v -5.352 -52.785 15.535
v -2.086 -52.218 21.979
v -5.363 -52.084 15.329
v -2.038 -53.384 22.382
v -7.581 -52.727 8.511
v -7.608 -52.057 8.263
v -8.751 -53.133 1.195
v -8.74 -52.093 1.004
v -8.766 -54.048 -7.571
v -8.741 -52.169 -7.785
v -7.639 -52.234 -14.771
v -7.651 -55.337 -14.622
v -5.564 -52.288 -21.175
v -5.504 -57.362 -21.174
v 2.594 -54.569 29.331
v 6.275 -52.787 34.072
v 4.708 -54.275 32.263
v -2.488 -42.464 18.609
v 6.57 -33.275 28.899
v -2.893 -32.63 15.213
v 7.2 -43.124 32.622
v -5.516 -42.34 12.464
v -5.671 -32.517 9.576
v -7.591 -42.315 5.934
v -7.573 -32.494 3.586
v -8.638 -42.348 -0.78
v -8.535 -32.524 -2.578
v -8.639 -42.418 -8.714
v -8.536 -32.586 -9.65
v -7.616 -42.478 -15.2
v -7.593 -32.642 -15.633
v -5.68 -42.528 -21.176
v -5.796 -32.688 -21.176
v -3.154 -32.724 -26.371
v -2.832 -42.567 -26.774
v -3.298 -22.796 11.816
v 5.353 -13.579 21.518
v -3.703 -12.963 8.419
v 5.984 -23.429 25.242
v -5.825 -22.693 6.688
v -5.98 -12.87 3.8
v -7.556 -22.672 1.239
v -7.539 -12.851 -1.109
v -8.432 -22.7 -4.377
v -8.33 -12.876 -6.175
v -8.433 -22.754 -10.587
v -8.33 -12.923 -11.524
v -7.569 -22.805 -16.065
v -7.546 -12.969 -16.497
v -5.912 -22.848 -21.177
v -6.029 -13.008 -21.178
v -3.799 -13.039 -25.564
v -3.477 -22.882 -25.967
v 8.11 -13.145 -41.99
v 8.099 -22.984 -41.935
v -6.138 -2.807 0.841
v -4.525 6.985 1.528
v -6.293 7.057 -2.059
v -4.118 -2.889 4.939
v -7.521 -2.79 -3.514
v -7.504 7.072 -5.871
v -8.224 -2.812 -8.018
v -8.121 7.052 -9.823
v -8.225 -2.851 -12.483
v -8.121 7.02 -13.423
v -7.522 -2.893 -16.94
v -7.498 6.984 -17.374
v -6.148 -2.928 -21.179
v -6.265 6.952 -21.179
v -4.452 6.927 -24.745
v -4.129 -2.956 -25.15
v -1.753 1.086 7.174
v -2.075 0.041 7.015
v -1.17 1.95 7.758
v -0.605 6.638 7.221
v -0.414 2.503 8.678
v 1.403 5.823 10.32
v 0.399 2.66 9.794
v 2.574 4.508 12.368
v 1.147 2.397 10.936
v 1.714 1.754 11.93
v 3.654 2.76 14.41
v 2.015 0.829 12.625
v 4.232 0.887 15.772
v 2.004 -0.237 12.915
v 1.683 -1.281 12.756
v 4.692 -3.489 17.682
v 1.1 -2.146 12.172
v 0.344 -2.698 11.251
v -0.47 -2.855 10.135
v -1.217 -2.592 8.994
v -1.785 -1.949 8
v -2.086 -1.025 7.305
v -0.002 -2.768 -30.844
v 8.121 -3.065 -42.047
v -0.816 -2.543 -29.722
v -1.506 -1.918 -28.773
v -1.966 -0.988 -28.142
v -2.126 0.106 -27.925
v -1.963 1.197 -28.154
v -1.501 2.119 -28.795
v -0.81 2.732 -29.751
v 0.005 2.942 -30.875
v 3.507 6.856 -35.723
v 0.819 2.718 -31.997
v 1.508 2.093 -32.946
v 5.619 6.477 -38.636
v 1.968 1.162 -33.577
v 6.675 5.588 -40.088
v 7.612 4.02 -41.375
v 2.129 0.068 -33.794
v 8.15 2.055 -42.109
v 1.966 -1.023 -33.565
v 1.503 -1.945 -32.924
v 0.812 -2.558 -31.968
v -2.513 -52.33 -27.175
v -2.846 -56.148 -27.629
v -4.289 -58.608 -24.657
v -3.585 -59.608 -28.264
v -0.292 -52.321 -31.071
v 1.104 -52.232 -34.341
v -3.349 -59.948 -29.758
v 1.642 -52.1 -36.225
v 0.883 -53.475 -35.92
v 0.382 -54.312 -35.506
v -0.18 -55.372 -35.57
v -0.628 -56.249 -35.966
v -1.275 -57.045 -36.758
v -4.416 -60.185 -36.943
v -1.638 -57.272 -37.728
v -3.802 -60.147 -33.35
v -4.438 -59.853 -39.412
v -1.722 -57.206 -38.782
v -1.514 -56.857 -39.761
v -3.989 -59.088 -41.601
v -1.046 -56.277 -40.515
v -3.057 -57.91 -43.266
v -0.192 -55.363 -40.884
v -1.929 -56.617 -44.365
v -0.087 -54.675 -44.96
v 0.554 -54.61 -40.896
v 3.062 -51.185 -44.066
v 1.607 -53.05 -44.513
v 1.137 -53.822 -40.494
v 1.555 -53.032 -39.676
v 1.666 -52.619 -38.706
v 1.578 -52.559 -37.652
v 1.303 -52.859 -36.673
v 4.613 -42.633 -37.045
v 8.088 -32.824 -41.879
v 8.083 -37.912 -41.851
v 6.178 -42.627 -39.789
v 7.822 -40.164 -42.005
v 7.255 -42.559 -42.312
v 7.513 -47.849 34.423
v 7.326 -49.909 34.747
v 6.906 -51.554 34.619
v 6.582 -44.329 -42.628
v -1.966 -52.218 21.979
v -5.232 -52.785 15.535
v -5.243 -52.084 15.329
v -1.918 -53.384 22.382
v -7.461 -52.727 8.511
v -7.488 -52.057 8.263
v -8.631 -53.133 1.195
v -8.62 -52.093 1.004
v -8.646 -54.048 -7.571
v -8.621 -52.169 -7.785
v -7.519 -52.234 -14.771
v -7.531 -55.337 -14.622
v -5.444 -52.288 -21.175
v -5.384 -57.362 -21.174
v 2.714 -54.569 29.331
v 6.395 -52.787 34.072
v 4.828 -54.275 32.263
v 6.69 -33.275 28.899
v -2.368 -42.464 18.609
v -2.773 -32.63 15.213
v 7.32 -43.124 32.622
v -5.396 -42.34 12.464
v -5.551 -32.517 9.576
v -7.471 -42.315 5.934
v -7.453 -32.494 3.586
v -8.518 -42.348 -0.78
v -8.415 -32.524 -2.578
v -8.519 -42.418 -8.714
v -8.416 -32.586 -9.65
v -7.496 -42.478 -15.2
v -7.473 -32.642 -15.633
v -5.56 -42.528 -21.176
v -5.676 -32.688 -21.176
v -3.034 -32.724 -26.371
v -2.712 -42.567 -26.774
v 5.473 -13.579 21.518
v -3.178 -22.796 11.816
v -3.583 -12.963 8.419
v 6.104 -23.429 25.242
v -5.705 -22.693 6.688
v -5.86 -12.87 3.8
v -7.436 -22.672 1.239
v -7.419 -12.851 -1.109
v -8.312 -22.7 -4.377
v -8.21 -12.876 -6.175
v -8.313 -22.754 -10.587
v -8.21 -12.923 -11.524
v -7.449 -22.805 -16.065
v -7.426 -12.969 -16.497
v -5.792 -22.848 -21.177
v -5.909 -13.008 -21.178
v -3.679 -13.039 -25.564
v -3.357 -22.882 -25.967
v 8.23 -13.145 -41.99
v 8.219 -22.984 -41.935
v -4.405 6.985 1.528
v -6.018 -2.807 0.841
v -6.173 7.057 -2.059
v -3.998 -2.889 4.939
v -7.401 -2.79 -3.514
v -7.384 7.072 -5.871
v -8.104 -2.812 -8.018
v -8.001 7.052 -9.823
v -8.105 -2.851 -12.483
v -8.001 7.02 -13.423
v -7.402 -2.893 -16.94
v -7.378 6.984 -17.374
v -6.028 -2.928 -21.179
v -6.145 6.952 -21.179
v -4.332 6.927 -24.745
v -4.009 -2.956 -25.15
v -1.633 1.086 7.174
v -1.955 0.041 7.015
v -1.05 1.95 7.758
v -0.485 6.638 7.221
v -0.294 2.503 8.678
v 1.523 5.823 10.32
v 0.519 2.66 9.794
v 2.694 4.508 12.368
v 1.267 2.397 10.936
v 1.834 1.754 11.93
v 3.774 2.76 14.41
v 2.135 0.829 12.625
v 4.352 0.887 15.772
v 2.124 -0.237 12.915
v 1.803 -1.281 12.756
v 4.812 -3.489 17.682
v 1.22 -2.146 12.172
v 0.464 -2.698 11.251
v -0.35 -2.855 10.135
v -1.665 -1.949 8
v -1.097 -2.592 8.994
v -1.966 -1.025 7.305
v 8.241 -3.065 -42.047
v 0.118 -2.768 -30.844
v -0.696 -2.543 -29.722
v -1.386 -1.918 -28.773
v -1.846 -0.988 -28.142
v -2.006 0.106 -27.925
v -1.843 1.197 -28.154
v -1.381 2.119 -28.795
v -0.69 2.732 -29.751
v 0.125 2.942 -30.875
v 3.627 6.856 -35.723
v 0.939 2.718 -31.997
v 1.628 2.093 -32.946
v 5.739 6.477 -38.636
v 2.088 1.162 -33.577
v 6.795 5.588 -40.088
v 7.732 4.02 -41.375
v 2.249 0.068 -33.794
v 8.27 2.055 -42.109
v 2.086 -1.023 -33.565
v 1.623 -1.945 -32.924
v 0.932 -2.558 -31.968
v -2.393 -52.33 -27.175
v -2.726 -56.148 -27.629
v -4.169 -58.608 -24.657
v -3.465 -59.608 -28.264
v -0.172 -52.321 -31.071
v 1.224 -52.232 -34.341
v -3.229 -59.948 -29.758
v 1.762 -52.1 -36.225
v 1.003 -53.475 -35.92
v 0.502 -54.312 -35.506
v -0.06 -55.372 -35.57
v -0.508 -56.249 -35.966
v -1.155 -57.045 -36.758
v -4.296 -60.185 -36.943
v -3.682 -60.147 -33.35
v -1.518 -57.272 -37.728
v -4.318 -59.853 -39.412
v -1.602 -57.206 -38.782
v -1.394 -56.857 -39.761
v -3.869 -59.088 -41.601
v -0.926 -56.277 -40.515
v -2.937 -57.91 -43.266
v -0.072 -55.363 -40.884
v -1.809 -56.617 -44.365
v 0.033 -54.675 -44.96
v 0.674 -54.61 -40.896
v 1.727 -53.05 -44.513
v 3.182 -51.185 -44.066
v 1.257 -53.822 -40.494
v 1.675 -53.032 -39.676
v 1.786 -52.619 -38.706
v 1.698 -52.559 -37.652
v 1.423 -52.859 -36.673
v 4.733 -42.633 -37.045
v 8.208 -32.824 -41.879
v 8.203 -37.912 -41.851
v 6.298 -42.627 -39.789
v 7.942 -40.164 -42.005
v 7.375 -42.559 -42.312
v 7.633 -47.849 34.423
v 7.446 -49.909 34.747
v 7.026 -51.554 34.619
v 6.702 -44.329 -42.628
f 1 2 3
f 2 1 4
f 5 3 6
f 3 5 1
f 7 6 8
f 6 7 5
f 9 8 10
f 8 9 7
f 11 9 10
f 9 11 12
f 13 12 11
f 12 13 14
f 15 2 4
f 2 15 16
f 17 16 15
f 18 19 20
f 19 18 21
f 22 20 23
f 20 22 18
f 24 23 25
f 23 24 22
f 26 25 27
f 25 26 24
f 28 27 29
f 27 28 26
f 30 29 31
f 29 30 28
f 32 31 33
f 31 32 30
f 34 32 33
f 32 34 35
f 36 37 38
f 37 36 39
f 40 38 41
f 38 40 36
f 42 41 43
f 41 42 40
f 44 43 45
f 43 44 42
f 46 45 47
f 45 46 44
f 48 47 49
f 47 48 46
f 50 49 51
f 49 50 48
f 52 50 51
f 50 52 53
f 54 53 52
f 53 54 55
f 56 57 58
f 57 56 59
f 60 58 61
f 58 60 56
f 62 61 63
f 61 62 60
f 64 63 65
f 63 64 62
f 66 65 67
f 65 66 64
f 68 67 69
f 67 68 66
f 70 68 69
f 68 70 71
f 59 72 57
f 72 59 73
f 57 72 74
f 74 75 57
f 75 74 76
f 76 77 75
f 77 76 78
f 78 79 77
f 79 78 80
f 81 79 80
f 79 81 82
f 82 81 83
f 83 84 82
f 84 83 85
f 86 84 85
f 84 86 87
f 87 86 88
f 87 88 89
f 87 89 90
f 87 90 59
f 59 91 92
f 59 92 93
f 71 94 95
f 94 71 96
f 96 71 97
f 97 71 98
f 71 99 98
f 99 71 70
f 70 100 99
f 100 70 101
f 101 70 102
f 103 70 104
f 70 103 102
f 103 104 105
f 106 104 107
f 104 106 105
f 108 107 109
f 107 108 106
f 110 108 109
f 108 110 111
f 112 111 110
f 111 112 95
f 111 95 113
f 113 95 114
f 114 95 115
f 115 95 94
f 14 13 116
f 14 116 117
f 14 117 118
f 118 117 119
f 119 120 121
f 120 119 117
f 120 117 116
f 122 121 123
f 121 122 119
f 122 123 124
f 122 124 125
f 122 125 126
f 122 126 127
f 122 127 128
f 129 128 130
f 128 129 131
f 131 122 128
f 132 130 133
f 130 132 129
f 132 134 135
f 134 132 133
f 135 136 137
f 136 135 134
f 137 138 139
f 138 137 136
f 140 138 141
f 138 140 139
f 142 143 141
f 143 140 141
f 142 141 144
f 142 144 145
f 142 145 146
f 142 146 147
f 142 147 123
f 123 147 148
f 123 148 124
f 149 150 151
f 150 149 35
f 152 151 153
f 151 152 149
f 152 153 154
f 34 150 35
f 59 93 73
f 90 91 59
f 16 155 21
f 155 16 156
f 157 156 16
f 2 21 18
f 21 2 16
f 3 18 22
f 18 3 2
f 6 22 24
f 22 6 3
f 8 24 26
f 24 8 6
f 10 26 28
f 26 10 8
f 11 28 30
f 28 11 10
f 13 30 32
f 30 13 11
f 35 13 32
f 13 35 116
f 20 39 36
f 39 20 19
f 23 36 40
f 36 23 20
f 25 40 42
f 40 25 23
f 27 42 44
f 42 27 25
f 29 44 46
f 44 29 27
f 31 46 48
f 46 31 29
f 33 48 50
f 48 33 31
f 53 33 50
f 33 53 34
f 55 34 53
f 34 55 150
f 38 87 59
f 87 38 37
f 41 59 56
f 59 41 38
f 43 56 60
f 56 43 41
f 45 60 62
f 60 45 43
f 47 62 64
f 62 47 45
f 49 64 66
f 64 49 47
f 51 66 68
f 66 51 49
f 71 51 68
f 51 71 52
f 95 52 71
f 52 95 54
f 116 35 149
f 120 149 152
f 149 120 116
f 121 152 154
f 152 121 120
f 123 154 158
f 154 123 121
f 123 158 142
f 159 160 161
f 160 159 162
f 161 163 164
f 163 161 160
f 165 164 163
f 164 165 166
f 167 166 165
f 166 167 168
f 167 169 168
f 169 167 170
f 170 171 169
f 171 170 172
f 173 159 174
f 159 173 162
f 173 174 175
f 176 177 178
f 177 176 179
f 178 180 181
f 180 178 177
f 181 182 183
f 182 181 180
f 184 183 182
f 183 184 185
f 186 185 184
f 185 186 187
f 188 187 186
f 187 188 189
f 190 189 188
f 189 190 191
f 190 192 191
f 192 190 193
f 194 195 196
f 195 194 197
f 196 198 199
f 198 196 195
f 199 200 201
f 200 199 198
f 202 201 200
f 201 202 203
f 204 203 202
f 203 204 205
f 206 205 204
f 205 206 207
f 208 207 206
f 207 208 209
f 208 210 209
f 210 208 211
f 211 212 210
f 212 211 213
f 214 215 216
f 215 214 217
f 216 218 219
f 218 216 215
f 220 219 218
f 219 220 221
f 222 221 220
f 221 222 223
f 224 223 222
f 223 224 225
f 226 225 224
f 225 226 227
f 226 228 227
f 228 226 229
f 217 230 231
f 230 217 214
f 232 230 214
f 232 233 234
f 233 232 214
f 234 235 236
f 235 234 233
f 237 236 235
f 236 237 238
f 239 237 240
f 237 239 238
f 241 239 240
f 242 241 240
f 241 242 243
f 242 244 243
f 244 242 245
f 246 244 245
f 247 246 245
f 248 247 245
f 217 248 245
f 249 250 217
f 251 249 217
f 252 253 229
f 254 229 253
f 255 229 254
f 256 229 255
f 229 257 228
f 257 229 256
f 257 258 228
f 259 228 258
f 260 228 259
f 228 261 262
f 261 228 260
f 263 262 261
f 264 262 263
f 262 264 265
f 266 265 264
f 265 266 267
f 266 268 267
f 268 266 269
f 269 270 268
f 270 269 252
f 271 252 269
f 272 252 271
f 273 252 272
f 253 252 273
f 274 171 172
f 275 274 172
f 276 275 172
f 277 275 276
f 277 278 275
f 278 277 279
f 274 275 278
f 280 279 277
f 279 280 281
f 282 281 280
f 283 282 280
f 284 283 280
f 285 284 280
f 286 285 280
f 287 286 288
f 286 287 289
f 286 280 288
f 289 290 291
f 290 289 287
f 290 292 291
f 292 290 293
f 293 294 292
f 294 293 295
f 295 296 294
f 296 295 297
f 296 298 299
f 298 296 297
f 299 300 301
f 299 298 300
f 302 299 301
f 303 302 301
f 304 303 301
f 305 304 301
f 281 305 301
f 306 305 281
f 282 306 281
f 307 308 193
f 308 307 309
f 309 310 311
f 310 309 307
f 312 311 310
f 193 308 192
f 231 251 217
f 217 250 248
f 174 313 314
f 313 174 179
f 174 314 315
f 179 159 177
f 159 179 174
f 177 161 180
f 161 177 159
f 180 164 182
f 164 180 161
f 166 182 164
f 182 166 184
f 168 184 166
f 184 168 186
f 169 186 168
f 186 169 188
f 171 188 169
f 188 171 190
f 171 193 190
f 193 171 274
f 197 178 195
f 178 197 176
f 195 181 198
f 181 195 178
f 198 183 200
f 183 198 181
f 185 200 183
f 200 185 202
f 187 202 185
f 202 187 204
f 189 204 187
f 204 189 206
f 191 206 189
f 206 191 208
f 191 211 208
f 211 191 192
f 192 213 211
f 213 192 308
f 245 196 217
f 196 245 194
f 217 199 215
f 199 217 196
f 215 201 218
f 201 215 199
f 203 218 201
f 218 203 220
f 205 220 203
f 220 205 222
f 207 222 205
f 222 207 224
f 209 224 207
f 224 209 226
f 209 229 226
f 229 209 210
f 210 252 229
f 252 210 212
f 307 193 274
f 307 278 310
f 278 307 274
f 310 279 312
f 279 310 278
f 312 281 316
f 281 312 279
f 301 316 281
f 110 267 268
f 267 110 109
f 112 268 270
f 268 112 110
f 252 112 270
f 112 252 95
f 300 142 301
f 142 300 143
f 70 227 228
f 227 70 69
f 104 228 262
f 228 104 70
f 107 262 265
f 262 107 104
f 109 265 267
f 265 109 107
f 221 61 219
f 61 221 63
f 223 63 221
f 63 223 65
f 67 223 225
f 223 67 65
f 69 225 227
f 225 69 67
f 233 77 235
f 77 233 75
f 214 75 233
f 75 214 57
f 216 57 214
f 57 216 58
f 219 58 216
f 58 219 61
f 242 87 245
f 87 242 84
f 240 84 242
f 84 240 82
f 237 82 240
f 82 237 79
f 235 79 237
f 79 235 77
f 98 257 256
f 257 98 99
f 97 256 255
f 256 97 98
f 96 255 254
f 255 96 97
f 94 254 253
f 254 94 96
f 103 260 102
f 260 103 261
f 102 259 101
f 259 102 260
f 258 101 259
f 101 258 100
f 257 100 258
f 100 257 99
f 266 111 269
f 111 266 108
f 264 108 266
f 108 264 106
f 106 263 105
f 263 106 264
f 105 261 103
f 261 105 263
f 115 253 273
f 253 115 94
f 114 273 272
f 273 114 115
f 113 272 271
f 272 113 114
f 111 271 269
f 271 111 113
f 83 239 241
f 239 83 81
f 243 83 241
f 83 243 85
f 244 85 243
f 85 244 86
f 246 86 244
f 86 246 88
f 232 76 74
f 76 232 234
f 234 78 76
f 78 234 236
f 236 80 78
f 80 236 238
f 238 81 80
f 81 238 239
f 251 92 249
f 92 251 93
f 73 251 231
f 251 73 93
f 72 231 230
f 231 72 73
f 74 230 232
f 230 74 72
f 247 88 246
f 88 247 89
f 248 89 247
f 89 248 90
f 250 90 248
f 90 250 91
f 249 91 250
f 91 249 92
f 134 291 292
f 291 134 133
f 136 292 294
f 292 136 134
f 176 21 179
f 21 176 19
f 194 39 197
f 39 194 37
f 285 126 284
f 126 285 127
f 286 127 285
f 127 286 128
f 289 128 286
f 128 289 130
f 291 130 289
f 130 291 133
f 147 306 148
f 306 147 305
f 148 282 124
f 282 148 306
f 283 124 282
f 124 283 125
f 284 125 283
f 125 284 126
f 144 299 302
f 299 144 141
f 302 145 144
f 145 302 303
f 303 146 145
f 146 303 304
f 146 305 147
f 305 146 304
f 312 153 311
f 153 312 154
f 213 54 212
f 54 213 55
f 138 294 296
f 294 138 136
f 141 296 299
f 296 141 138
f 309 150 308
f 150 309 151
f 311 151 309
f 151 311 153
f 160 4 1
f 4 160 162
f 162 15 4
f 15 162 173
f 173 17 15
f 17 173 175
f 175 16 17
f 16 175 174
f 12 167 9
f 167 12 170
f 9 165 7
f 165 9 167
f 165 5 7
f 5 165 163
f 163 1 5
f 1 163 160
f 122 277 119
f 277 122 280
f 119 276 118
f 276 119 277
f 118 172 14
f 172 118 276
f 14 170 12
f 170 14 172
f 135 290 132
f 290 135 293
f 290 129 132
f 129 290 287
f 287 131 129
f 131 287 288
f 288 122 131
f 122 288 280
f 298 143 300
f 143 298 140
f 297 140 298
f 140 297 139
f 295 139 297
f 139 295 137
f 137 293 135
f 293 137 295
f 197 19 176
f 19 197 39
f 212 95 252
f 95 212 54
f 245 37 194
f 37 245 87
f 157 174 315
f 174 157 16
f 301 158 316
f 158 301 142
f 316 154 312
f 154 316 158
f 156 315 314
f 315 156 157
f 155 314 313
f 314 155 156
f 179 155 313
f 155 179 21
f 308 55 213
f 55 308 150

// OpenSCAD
use <../lib.scad>
use <s/u768c01s01.scad>
use <s/u768c01s02.scad>
use <s/u768c01s03.scad>
use <s/u768c01s04.scad>
function ldraw_lib__u768c01() = [
// 0 Sail 11 x  9 Trapezoidal (Formed Shape 1)
// 0 Name: u768c01.dat
// 0 Author: Philippe Hurbain [Philo]
// 0 !LDRAW_ORG Part UPDATE 2024-05
// 0 !LICENSE Licensed under CC BY 4.0 : see CAreadme.txt
// 
// 0 !HELP Placement on mast:
// 0 !HELP 1 25 0 100 0 1 0 0 0 1 0 0 0 1 4318.dat
// 0 !HELP 1 25 0 92 -24 -1 0 0 0 1 0 0 0 -1 4319.dat
// 
// 0 BFC CERTIFY CCW
  [0,"BFC","CERTIFY"],
  [0,"BFC","CCW"],
// 
// 0 !CATEGORY Sheet Fabric
// 
// 0 !HISTORY 2024-06-30 [OrionP] Official Update 2024-05
// 
// 
// 1 16 0 0 0 1 0 0 0 1 0 0 0 1 s\u768c01s01.dat
  [1,16,0,0,0,1,0,0,0,1,0,0,0,1, ldraw_lib__s__u768c01s01()],
// 1 16 0 0 0 1 0 0 0 1 0 0 0 1 s\u768c01s02.dat
  [1,16,0,0,0,1,0,0,0,1,0,0,0,1, ldraw_lib__s__u768c01s02()],
// 0 BFC INVERTNEXT
  [0,"BFC","INVERTNEXT"],
// 1 16 .3 0 0 1 0 0 0 1 0 0 0 1 s\u768c01s01.dat
  [1,16,.3,0,0,1,0,0,0,1,0,0,0,1, ldraw_lib__s__u768c01s01()],
// 0 BFC INVERTNEXT
  [0,"BFC","INVERTNEXT"],
// 1 16 .3 0 0 1 0 0 0 1 0 0 0 1 s\u768c01s02.dat
  [1,16,.3,0,0,1,0,0,0,1,0,0,0,1, ldraw_lib__s__u768c01s02()],
// 
// 1 16 0 0 0 1 0 0 0 1 0 0 0 1 s\u768c01s03.dat
  [1,16,0,0,0,1,0,0,0,1,0,0,0,1, ldraw_lib__s__u768c01s03()],
// 1 16 0 0 0 1 0 0 0 1 0 0 0 1 s\u768c01s04.dat
  [1,16,0,0,0,1,0,0,0,1,0,0,0,1, ldraw_lib__s__u768c01s04()],
];
module ldraw_lib__u768c01(step=0, col=false, unit=2/5, alt=false, line=0.2, solid=!$preview)
    makepoly(ldraw_lib__u768c01(), step=step, col=col, unit=unit, alt=alt, line=line, solid=solid);
ldraw_lib__u768c01(line=0.2);
